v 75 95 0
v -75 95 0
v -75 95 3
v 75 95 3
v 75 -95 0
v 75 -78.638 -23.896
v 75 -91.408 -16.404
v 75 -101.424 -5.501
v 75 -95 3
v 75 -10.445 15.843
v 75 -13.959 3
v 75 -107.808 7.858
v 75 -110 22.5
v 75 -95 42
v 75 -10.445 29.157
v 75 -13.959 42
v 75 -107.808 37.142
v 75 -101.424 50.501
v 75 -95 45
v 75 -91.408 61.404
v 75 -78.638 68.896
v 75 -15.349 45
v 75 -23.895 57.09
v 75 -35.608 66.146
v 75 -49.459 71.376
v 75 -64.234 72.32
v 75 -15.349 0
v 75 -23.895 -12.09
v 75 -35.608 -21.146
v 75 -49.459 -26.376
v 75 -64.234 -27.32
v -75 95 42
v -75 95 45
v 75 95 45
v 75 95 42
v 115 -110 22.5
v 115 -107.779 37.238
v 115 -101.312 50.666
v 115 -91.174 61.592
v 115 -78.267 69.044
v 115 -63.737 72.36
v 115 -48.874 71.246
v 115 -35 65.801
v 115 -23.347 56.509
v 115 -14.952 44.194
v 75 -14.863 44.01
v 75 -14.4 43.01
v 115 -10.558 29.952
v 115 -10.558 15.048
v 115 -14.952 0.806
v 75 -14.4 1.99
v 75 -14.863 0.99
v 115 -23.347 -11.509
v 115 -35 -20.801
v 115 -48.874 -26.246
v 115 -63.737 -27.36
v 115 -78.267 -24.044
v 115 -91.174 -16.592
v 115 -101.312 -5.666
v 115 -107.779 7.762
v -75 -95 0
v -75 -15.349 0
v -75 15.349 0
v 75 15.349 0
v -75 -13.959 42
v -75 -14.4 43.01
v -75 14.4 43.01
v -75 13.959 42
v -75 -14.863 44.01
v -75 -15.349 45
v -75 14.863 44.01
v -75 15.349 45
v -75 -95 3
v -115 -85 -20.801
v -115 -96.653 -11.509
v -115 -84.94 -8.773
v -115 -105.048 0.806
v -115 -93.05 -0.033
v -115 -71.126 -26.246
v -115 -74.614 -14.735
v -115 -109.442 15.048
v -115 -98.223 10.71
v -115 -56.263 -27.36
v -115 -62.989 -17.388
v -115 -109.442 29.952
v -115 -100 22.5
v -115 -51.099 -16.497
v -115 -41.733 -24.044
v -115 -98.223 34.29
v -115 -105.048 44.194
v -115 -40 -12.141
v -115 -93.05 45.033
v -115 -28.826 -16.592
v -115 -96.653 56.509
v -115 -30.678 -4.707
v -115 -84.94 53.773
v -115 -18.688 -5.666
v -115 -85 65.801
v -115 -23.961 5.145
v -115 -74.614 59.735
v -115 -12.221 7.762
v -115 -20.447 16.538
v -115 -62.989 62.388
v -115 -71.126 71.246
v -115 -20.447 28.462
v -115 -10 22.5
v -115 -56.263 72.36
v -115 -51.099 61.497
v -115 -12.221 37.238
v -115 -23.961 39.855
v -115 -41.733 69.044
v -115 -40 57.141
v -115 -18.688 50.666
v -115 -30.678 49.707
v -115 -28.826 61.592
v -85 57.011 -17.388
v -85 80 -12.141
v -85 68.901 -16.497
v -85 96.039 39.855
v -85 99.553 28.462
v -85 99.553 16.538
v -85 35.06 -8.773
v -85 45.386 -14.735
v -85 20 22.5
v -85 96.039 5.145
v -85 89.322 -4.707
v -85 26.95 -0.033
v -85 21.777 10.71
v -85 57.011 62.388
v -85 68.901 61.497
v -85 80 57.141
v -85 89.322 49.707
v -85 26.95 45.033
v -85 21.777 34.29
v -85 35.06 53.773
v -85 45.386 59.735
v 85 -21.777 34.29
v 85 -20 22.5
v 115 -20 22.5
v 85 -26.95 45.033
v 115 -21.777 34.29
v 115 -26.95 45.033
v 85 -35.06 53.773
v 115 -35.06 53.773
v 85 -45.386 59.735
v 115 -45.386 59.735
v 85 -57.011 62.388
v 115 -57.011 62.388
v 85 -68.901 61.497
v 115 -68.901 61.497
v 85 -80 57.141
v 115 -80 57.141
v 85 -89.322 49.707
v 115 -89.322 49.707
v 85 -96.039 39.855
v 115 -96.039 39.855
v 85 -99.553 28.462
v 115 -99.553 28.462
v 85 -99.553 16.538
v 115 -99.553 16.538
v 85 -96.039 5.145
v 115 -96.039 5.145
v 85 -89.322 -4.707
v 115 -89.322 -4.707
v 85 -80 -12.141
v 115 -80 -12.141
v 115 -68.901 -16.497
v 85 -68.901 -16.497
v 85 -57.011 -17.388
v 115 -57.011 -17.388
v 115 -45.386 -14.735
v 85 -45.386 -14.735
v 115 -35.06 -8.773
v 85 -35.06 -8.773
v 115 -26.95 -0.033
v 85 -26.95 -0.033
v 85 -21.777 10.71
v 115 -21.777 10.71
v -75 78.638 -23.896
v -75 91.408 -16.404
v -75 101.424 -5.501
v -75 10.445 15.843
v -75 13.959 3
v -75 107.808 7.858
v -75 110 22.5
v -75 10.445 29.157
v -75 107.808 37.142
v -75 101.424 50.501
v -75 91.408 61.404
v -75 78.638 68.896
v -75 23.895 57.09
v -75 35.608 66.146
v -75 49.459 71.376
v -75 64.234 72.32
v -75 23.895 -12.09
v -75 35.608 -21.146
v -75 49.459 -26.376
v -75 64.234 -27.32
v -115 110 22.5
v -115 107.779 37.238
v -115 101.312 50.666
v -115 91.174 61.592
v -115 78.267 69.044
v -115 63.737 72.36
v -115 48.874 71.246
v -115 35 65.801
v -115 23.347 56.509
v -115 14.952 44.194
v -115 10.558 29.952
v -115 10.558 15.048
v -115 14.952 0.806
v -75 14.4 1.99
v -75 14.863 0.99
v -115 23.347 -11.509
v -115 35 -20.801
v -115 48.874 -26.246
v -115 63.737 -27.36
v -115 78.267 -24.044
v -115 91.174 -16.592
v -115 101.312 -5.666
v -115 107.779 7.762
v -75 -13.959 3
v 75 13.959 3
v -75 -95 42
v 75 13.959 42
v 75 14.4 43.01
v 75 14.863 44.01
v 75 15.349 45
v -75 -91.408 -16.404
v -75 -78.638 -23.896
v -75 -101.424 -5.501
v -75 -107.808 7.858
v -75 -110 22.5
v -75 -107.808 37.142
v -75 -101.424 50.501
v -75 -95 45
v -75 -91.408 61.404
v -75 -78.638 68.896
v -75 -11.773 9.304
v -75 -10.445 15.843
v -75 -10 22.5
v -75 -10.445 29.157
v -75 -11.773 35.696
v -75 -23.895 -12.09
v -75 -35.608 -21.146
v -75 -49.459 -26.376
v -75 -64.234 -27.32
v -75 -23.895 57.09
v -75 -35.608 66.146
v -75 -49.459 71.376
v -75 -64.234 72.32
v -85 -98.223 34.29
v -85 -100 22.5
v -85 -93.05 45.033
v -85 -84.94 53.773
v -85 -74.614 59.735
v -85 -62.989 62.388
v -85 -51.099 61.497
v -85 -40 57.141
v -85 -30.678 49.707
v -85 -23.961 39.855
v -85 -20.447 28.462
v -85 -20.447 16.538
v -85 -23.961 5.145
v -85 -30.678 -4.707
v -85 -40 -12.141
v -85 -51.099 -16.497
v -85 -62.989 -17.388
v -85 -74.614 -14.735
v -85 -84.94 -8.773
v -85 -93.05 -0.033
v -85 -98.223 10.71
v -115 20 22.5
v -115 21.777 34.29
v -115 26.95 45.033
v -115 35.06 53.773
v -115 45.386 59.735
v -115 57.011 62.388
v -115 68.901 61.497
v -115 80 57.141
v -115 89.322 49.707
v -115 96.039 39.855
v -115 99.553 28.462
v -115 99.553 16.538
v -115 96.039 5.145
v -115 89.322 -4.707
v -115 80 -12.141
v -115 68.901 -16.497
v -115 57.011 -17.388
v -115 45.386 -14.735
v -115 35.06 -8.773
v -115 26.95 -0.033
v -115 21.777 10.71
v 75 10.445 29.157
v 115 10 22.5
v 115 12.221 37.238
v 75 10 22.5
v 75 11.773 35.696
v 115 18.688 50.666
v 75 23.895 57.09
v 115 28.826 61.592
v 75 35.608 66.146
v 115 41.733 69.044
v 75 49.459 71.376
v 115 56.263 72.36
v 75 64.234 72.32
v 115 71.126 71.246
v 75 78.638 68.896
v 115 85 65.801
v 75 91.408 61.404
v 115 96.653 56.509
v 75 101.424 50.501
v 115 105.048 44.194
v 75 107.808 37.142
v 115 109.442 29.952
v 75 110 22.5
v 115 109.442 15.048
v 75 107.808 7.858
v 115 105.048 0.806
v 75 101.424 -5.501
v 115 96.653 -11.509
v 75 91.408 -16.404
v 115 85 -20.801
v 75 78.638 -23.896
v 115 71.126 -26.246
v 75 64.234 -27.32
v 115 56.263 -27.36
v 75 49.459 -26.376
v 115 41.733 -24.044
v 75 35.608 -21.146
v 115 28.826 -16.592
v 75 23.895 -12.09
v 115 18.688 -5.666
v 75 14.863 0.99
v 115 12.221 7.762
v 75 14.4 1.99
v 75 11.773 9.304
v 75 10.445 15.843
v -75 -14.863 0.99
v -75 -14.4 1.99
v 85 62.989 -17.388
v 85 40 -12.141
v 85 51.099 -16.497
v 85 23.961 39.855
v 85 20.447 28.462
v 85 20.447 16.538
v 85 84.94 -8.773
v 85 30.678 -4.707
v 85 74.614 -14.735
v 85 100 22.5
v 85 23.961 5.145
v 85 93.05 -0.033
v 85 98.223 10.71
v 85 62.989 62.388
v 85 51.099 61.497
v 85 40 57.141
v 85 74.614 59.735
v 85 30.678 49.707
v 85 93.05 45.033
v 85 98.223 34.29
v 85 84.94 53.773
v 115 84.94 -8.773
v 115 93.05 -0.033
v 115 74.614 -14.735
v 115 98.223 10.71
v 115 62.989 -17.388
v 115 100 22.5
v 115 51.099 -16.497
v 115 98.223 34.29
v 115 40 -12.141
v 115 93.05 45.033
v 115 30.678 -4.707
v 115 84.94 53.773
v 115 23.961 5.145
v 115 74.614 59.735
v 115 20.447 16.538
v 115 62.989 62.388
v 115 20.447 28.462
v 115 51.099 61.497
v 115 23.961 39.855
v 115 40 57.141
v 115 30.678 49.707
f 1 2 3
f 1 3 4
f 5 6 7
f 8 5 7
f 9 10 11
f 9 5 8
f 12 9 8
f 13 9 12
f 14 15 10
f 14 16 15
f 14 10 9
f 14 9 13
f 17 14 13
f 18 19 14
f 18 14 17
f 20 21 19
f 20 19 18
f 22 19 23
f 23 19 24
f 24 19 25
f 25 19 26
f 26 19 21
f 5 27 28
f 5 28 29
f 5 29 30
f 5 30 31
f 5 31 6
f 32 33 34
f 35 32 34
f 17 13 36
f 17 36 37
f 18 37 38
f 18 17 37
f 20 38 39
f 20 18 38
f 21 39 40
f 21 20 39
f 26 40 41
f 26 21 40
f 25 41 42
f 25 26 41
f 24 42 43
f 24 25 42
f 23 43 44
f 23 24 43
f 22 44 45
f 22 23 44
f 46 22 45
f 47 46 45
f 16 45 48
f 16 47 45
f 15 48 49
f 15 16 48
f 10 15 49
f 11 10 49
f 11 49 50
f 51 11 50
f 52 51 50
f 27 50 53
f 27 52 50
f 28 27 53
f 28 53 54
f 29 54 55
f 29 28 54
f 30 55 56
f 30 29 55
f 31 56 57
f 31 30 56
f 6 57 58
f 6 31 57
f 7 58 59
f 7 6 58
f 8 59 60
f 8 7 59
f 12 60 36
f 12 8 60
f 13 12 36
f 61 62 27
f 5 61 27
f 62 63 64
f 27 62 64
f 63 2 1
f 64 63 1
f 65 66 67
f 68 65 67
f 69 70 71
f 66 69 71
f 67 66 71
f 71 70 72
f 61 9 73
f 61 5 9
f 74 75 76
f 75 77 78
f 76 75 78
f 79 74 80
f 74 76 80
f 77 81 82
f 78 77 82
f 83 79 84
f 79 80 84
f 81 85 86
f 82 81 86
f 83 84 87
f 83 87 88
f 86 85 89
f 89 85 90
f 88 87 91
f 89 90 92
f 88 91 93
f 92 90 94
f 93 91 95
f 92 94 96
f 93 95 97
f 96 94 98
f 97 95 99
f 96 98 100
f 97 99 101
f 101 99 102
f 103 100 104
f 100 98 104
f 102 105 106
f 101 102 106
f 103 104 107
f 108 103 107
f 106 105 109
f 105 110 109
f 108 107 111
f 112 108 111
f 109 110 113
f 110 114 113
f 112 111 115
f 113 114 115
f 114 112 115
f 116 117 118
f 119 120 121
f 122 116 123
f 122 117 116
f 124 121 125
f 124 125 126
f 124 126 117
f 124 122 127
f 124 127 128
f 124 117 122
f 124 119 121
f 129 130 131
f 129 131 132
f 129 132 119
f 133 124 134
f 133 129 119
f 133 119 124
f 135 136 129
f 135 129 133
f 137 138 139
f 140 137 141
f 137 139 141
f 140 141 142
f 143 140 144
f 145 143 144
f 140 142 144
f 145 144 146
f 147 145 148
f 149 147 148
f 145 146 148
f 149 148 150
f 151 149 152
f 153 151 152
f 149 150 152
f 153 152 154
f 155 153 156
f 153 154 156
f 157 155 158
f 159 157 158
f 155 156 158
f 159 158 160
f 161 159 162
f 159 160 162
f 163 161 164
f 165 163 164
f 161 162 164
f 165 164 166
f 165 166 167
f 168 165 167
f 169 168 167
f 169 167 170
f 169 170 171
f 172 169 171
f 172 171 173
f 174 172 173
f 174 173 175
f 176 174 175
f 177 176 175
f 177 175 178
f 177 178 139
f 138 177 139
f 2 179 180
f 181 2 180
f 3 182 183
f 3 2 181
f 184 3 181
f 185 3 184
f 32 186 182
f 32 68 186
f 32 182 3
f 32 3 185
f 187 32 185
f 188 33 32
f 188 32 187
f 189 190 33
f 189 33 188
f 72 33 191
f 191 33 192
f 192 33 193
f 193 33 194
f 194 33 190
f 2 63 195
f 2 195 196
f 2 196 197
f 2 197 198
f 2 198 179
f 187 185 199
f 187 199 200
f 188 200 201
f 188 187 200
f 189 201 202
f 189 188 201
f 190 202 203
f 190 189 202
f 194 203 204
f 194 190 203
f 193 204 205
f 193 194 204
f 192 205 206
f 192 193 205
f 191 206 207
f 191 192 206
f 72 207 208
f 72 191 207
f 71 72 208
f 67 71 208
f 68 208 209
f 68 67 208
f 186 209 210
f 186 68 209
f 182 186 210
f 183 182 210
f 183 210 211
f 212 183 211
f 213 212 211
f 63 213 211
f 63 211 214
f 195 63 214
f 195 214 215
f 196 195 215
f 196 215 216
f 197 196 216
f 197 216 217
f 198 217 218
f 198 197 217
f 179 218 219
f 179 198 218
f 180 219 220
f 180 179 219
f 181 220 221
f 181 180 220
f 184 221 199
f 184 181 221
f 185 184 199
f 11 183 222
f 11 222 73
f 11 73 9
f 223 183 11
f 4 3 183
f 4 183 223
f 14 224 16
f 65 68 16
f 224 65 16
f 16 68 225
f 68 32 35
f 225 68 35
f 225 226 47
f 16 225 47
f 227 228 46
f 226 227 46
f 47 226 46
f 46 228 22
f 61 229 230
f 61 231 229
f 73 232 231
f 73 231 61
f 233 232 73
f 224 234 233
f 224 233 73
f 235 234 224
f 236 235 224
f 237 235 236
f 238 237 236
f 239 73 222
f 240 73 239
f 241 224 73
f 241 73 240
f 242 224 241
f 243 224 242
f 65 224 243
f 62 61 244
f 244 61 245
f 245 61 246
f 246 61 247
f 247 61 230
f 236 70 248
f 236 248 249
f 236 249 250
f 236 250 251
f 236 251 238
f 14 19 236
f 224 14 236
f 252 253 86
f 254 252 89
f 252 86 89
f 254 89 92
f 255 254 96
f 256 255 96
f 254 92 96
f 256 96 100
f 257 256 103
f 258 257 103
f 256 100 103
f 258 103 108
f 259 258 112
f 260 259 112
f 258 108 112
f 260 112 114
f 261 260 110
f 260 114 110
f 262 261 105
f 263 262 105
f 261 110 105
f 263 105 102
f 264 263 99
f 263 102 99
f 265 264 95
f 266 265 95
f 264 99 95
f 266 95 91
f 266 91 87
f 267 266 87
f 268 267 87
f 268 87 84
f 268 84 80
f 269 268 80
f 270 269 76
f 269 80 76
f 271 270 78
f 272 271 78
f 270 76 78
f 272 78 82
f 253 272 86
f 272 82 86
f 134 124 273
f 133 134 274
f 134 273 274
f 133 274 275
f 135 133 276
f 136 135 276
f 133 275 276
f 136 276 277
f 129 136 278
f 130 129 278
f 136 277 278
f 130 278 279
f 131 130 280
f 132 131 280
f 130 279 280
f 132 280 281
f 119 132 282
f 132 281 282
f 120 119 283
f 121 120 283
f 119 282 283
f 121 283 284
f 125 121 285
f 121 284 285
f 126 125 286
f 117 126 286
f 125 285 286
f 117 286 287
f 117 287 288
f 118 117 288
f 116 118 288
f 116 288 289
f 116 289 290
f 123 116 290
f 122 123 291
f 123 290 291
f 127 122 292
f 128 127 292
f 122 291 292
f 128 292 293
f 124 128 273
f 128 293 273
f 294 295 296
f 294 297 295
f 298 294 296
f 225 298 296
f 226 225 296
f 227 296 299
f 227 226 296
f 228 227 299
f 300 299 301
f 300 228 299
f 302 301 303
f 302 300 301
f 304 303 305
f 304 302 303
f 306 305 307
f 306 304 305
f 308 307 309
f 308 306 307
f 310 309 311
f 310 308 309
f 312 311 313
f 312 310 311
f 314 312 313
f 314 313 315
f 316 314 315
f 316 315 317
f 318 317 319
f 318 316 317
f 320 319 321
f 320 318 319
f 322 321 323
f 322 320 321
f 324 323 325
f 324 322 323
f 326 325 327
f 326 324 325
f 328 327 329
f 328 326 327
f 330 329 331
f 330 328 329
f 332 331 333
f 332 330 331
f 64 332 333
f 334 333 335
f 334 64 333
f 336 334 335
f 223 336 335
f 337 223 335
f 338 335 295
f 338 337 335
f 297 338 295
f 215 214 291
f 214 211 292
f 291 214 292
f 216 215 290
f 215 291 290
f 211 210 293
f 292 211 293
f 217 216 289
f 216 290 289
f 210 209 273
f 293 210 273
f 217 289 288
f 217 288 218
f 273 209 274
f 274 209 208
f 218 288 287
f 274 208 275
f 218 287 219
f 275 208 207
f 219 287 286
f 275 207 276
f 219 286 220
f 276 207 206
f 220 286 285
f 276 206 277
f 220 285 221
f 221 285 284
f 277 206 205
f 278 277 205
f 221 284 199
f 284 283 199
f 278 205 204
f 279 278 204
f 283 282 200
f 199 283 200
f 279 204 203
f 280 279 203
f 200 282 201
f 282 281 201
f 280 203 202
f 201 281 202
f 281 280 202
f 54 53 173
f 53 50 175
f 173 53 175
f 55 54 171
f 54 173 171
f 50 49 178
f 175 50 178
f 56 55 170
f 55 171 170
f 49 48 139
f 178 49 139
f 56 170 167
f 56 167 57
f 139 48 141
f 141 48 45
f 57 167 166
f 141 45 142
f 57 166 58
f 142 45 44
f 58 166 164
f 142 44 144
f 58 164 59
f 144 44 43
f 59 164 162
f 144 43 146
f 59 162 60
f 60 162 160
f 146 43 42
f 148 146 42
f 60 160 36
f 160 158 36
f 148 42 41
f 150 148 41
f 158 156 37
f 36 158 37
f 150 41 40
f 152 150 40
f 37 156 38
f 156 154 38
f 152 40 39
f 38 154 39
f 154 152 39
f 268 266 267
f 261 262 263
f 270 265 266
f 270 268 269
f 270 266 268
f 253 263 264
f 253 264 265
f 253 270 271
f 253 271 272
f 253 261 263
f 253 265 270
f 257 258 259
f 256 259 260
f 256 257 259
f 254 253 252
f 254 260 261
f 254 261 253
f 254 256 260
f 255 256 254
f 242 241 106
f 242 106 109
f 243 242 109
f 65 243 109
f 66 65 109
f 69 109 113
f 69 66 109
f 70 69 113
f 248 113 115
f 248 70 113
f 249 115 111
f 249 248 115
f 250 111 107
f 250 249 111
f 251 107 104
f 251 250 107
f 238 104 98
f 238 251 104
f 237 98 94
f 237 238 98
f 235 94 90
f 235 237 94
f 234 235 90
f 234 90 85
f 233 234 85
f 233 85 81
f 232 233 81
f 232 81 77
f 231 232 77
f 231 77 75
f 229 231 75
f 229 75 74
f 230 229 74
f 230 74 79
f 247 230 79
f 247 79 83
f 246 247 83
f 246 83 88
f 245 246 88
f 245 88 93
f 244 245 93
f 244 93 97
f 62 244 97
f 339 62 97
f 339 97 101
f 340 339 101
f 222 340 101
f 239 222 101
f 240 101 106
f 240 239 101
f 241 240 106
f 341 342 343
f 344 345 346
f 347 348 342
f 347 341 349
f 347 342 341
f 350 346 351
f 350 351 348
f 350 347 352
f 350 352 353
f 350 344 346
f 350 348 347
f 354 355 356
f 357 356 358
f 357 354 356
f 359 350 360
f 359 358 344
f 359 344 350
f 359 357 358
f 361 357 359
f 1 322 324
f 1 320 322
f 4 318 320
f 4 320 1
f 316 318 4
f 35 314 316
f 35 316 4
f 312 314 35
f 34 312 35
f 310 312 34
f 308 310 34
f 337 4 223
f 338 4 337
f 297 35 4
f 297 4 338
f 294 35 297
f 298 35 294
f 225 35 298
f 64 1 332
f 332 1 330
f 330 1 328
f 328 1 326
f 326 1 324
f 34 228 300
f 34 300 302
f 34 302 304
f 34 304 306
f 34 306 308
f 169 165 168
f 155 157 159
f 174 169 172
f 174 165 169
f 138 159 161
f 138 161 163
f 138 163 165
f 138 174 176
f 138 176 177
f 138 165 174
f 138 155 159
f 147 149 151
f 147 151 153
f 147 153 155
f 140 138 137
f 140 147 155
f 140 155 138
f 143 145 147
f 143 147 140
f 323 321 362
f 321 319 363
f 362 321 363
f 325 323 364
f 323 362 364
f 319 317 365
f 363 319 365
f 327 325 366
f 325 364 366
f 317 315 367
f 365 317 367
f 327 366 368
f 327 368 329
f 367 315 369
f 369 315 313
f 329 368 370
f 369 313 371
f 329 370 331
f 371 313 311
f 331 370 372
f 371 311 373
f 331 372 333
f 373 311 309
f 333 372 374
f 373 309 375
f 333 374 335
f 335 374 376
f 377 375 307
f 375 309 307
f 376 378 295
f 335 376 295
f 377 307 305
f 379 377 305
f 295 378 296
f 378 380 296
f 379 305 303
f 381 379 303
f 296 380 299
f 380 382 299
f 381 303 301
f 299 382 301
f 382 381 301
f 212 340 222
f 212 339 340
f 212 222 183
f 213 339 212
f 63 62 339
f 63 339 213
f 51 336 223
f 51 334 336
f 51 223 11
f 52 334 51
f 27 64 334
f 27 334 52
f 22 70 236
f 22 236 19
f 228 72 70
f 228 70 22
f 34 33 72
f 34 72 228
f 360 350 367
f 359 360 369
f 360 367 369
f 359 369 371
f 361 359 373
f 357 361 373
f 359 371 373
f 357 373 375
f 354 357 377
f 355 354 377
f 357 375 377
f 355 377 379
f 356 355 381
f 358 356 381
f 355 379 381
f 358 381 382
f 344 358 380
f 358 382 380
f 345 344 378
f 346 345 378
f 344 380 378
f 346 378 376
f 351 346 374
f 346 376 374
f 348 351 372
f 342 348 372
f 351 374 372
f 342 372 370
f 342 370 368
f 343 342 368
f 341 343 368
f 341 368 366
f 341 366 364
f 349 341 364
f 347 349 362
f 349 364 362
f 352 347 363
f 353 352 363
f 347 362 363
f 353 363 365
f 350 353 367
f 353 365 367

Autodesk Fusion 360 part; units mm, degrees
sketch "Sketch1" plane through (0, 0, 0) normal (0, 0, 1) x (1, 0, 0)
  line L0 (75, -95) -> (-75, -95)
  line L1 (-75, -95) -> (-75, 95)
  line L2 (-75, 95) -> (75, 95)
  line L3 (75, 95) -> (75, -95)
  line L4 (75, -95) -> (-75, 95) construction
  line L5 (-75, -95) -> (75, 95) construction
  dimension "d1" = 150
  dimension "d2" = 190
ref_plane "WorkPlane1" through (0, 0, 45) normal (0, 0, 1) x (1, 0, 0)
sketch "Sketch2" plane through (0, 0, 45) normal (0, 0, 1) x (1, 0, 0)
  line L0 (75, -95) -> (-75, -95)
  line L1 (-75, -95) -> (-75, 95)
  line L2 (-75, 95) -> (75, 95)
  line L3 (75, 95) -> (75, -95)
  line L4 (75, -95) -> (-75, 95) construction
  line L5 (-75, -95) -> (75, 95) construction
  dimension "d4" = 150
  dimension "d5" = 190
sketch "Sketch3" plane through (0, 0, 45) normal (0, 0, 1) x (1, 0, 0)
ref_plane "WorkPlane2" through (75, 95, 45) normal (-1, 0, 0) x (0, -1, 0)
sketch "Sketch4" plane through (75, 95, 45) normal (-1, 0, 0) x (0, -1, 0)
  circle A0 centre (155, -22.5) radius 50
  line L0 (0, 0) -> (190, 0)
  circle A1 centre (35, -22.5) radius 50
  dimension "d6" = 100
  dimension "d7" = 22.5
  dimension "d8" = 100
  dimension "d9" = 22.5
  dimension "d10" = 120
  dimension "d11" = 155
ref_plane "WorkPlane3" through (-75, -95, 45) normal (1, 0, 0) x (0, 1, 0)
sketch "Sketch5" plane through (-75, -95, 45) normal (1, 0, 0) x (0, 1, 0)
  circle A0 centre (155, -22.5) radius 50
  circle A1 centre (35, -22.5) radius 50
  line L0 (0, 0) -> (190, 0)
  dimension "d12" = 100
  dimension "d13" = 100
  dimension "d14" = 120
  dimension "d15" = 155
  dimension "d16" = 22.5
  dimension "d17" = 22.5
extrude "Extrude1" add sketch "Sketch2" against normal blind 3 makes body 1
extrude "Extrude2" add sketch "Sketch1" along normal blind 3 separate body makes body 2
extrude "Extrude3" add sketch "Sketch4" against normal blind 40 bodies 1 2
extrude "Extrude4" add sketch "Sketch5" against normal blind 40 bodies 1
sketch "Sketch6" plane through (115, 0, 0) normal (1, 0, 0) x (0, 1, 0)
  circle A0 centre (-60, 22.5) radius 50
  circle A1 centre (-60, 22.5) radius 40
  dimension "d26" = -10
sketch "Sketch7" plane through (115, 0, 0) normal (1, 0, 0) x (0, 1, 0)
  circle A0 centre (60, 22.5) radius 50
  circle A1 centre (60, 22.5) radius 40
  dimension "d27" = -10
extrude "Extrude5" cut sketch "Sketch6" sketch "Sketch7" against normal blind 30 contours A1 of sketch 2 contours A1 bodies 1
sketch "Sketch8" plane through (-115, 0, 0) normal (-1, 0, 0) x (0, -1, 0)
  circle A0 centre (-60, 22.5) radius 50
  circle A1 centre (-60, 22.5) radius 40
  dimension "d30" = -10
sketch "Sketch9" plane through (-115, 0, 0) normal (-1, 0, 0) x (0, -1, 0)
  circle A0 centre (60, 22.5) radius 50
  circle A1 centre (60, 22.5) radius 40
  dimension "d31" = -10
extrude "Extrude6" cut sketch "Sketch8" sketch "Sketch9" against normal blind 30 contours A1 of sketch 2 contours A1 bodies 1
